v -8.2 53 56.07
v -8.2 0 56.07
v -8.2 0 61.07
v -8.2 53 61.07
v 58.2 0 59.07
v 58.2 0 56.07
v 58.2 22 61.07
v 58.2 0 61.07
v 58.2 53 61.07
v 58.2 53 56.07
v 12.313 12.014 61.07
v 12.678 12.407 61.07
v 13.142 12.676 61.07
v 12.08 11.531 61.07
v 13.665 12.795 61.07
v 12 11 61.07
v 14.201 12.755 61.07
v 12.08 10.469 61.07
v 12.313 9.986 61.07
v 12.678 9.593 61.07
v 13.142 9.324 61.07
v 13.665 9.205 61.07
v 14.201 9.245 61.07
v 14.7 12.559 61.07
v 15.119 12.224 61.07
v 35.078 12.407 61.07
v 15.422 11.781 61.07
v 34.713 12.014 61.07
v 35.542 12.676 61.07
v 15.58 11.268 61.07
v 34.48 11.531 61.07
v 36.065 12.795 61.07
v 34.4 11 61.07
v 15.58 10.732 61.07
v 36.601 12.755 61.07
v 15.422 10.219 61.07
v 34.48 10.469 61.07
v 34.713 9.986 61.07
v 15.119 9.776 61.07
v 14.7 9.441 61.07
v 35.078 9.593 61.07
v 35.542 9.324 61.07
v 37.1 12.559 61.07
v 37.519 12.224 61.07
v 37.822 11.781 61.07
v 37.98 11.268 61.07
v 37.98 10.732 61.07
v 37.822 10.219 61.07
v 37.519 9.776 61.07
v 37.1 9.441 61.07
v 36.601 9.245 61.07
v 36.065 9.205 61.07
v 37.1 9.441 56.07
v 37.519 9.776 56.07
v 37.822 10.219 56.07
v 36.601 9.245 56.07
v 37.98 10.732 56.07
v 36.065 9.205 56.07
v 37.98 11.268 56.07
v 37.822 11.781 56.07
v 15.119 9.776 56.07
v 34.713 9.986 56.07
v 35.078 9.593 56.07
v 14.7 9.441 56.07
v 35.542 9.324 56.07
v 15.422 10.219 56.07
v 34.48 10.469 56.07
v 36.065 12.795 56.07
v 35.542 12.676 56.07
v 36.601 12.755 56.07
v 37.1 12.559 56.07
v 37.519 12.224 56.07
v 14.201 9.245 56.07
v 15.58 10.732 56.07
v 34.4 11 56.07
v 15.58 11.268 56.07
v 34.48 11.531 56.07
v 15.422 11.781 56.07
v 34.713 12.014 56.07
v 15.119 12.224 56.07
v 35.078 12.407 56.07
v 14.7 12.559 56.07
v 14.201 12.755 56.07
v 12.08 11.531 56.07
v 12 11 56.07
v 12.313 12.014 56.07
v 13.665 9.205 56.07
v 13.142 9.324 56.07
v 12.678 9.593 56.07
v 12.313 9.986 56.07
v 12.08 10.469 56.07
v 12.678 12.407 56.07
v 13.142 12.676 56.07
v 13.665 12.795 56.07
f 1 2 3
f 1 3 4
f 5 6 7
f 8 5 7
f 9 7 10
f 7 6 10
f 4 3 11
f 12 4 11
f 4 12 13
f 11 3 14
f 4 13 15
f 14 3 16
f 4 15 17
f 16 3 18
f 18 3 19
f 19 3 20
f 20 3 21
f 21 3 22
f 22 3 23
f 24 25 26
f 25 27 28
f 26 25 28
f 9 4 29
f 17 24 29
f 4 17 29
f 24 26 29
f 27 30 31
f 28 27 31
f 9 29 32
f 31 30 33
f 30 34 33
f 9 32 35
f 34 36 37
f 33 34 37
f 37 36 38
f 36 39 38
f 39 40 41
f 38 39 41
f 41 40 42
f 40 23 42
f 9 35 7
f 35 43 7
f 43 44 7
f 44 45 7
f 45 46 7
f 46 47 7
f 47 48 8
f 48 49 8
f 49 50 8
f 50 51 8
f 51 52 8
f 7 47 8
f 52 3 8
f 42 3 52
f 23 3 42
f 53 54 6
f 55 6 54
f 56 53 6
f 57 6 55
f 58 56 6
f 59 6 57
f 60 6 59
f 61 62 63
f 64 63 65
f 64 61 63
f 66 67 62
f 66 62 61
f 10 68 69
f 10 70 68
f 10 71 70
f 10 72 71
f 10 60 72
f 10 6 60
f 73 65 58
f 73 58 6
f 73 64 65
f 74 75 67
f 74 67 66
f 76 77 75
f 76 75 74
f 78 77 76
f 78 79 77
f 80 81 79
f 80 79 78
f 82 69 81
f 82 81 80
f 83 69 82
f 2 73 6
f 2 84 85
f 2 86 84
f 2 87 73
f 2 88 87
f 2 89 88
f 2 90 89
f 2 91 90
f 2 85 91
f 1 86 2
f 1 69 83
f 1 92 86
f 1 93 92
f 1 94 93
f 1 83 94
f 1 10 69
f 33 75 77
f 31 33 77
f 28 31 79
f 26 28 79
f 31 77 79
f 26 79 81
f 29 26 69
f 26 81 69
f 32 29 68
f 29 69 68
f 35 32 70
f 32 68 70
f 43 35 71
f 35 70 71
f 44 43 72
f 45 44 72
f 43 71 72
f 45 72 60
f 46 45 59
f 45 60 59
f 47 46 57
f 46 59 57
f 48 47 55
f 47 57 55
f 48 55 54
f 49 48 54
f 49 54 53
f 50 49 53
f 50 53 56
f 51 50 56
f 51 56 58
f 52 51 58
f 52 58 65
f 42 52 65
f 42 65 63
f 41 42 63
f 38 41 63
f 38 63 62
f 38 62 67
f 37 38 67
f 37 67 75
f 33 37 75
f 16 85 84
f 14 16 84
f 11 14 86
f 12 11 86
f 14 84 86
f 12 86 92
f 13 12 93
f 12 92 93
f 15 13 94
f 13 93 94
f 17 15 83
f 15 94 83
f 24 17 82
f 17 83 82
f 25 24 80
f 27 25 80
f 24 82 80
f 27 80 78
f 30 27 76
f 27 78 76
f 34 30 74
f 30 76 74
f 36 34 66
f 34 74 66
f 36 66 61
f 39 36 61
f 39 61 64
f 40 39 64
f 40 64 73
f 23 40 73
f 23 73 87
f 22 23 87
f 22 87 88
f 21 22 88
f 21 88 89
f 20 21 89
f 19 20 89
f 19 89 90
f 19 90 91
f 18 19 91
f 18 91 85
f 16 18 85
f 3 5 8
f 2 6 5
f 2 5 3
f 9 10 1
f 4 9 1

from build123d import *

# Parameters (mm, degrees)
SKETCH1_W                = 50
SKETCH1_H                = 9.1
BOSS_EXTRUDE1_DEPTH      = 2
SKETCH2_W                = 25
SKETCH2_H                = 6.6
CUT_EXTRUDE1_DEPTH       = 2
SKETCH3_R                = 1.8
CUT_EXTRUDE2_DEPTH       = 2
SKETCH4_W                = 66.4
SKETCH4_H                = 130
BOSS_EXTRUDE2_DEPTH      = 2
SKETCH5_W                = 66.4
SKETCH5_H                = 2
BOSS_EXTRUDE3_DEPTH      = 2.5
SKETCH6_W                = 8.6
SKETCH6_H                = 62.5
BOSS_EXTRUDE4_DEPTH      = 2
SKETCH7_R                = 1.8
SKETCH7_W                = 3
SKETCH7_H                = 5
CUT_EXTRUDE3_DEPTH       = 2
SKETCH8_W                = 25
SKETCH8_H                = 45
CUT_EXTRUDE4_DEPTH       = 20
SKETCH9_W                = 25
SKETCH9_H                = 10
BOSS_EXTRUDE5_DEPTH      = 2
SKETCH10_W               = 34.7
SKETCH10_H               = 27.07
BOSS_EXTRUDE6_DEPTH      = 2
SKETCH11_R               = 1.8
CUT_EXTRUDE5_DEPTH       = 2
SKETCH12_R               = 1.8
CUT_EXTRUDE6_DEPTH       = 2
SKETCH13_W               = 2
SKETCH13_H               = 2
BOSS_EXTRUDE7_DEPTH      = 44
SKETCH14_W               = 2
SKETCH14_H               = 2
BOSS_EXTRUDE8_DEPTH      = 46
SKETCH16_W               = 42
SKETCH16_H               = 43
BOSS_EXTRUDE10_DEPTH     = 2
SKETCH18_R               = 1.8
CUT_EXTRUDE7_DEPTH       = 2
BOSS_EXTRUDE12_DEPTH     = 2
SKETCH21_W               = 2
SKETCH21_H               = 2
BOSS_EXTRUDE13_DEPTH     = 10
SKETCH25_W               = 3
SKETCH25_H               = 5
CUT_EXTRUDE8_DEPTH       = 10
SKETCH26_W               = 6.2
SKETCH26_H               = 13
SKETCH26_W_2             = 21
SKETCH26_H_2             = 6.6
BOSS_EXTRUDE14_DEPTH     = 2
SKETCH27_W               = 2
SKETCH27_H               = 27
SKETCH27_H_2             = 24.93
BOSS_EXTRUDE15_DEPTH     = 2
SKETCH29_W               = 10
SKETCH29_H               = 10
BOSS_EXTRUDE19_DEPTH     = 2
SKETCH41_R               = 1.8
CUT_EXTRUDE15_DEPTH      = 2
BOSS_EXTRUDE26_DEPTH     = 2
SKETCH43_W               = 70.4
SKETCH43_H               = 2
BOSS_EXTRUDE27_DEPTH     = 11
SKETCH44_W               = 10
SKETCH44_H               = 5
BOSS_EXTRUDE28_DEPTH     = 2
SKETCH45_R               = 1.8
BOSS_EXTRUDE29_DEPTH     = 2
SKETCH46_R               = 1.8
CUT_EXTRUDE16_DEPTH      = 2
SKETCH47_W               = 10
SKETCH47_H               = 1
BOSS_EXTRUDE30_DEPTH     = 2
SKETCH48_W               = 32.7
SKETCH48_H               = 31.07
SKETCH48_W_2             = 101.75
SKETCH48_H_2             = 120.487369876
CUT_EXTRUDE17_DEPTH      = 20
SKETCH50_W               = 66.4
SKETCH50_H               = 81.07
CUT_EXTRUDE19_DEPTH      = 20
SKETCH51_W               = 70.4
SKETCH51_H               = 85.07
SKETCH51_W_2             = 66.4
SKETCH51_H_2             = 81.07
BOSS_EXTRUDE31_DEPTH     = 20
SKETCH52_W               = 10
SKETCH52_H               = 1
BOSS_EXTRUDE32_DEPTH     = 2
SKETCH53_W               = 10
SKETCH53_H               = 4
CUT_EXTRUDE20_DEPTH      = 2
BOSS_EXTRUDE33_START     = 1
SKETCH54_W               = 10
SKETCH54_H               = 12
SKETCH54_R               = 1.8
BOSS_EXTRUDE33_DEPTH     = 1
CUT_EXTRUDE23_DEPTH      = 96
CUT_EXTRUDE23_DEPTH_BACK = 16
SKETCH59_R               = 1.8
SKETCH62_W               = 66.985033768
SKETCH62_H               = 11.249394984
BOSS_EXTRUDE38_DEPTH     = 1
SKETCH65_R               = 1.8
CUT_EXTRUDE27_DEPTH      = 3
SKETCH66_R               = 1
CUT_EXTRUDE28_DEPTH      = 87
BOSS_EXTRUDE41_DEPTH     = 2
BOSS_EXTRUDE42_DEPTH     = 2
BOSS_EXTRUDE43_DEPTH     = 2
SKETCH68_W               = 6.791832398
SKETCH68_H               = 8.144168394
SKETCH68_W_2             = 5.485710784
SKETCH68_W_3             = 7.764004839
SKETCH68_H_2             = 11.628907231
BOSS_EXTRUDE44_DEPTH     = 2
BOSS_EXTRUDE45_DEPTH     = 2
SKETCH70_R               = 1.8
CUT_EXTRUDE29_DEPTH      = 83
SKETCH72_W               = 109.694125273
SKETCH72_H               = 49.124079095
CUT_EXTRUDE30_DEPTH      = 90
SKETCH73_W               = 16.906531278
SKETCH73_H               = 38.825332728
SKETCH73_W_2             = 13.856512057
SKETCH73_H_2             = 35.444026473
CUT_EXTRUDE31_DEPTH      = 90
SKETCH74_W               = 66.4
SKETCH74_H               = 2
BOSS_EXTRUDE46_DEPTH     = 31
BOSS_EXTRUDE47_START     = 3
SKETCH75_W               = 66.4
SKETCH75_H               = 53
SKETCH75_R               = 1.8
BOSS_EXTRUDE47_DEPTH     = 3


with BuildPart() as part:
    # Sketch1 → Boss-Extrude1 (new body)
    with BuildSketch(Plane(origin=(0, 0, 0), x_dir=(1, 0, 0), z_dir=(0, 1, 0))):
        with Locations((25, 4.55)):
            Rectangle(SKETCH1_W, SKETCH1_H)
    extrude(amount=BOSS_EXTRUDE1_DEPTH)

    # Sketch2 → Cut-Extrude1 (cut)
    with BuildSketch(Plane(origin=(0, 2, 0), x_dir=(1, 0, 0), z_dir=(0, 1, 0))):
        with Locations((25, 5.8)):
            Rectangle(SKETCH2_W, SKETCH2_H)
    extrude(amount=-CUT_EXTRUDE1_DEPTH, mode=Mode.SUBTRACT)

    # Sketch3 → Cut-Extrude2 (cut)
    with BuildSketch(Plane(origin=(0, 2, 0), x_dir=(1, 0, 0), z_dir=(0, 1, 0))):
        with Locations(Location((6.25, 5.8, 0), (0, 0, 270))):
            Circle(SKETCH3_R)
        with Locations(Location((43.75, 5.8, 0), (0, 0, 270))):
            Circle(SKETCH3_R)
    extrude(amount=-CUT_EXTRUDE2_DEPTH, mode=Mode.SUBTRACT)

    # Sketch4 → Boss-Extrude2 (add)
    with BuildSketch(Plane(origin=(0, 2, 0), x_dir=(1, 0, 0), z_dir=(0, 1, 0))):
        with Locations((25, -65)):
            Rectangle(SKETCH4_W, SKETCH4_H)
    extrude(amount=-BOSS_EXTRUDE2_DEPTH)

    # Sketch5 → Boss-Extrude3 (add)
    with BuildSketch(Plane.XY.offset(130)):
        with Locations((25, 1)):
            Rectangle(SKETCH5_W, SKETCH5_H)
    extrude(amount=BOSS_EXTRUDE3_DEPTH)

    # Sketch6 → Boss-Extrude4 (add)
    with BuildSketch(Plane(origin=(0, 2, 0), x_dir=(1, 0, 0), z_dir=(0, 1, 0))):
        with Locations((-12.5, -101.25)):
            Rectangle(SKETCH6_W, SKETCH6_H)
        with Locations((62.5, -101.25)):
            Rectangle(SKETCH6_W, SKETCH6_H)
    extrude(amount=-BOSS_EXTRUDE4_DEPTH)

    # Sketch7 → Cut-Extrude3 (cut)
    with BuildSketch(Plane(origin=(0, 2, 0), x_dir=(1, 0, 0), z_dir=(0, 1, 0))):
        with Locations(Location((-13.5, -77, 0), (0, 0, 270))):
            Circle(SKETCH7_R)
        with Locations(Location((-13.5, -101.25, 0), (0, 0, 270))):
            Circle(SKETCH7_R)
        with Locations(Location((-13.5, -125.5, 0), (0, 0, 270))):
            Circle(SKETCH7_R)
        with Locations(Location((63.5, -77, 0), (0, 0, 270))):
            Circle(SKETCH7_R)
        with Locations(Location((63.5, -101.25, 0), (0, 0, 270))):
            Circle(SKETCH7_R)
        with Locations(Location((63.5, -125.5, 0), (0, 0, 270))):
            Circle(SKETCH7_R)
        with Locations((-13.5, -117.5)):
            Rectangle(SKETCH7_W, SKETCH7_H)
        with Locations((63.5, -117.5)):
            Rectangle(SKETCH7_W, SKETCH7_H)
    extrude(amount=-CUT_EXTRUDE3_DEPTH, mode=Mode.SUBTRACT)

    # Sketch8 → Cut-Extrude4 (cut)
    with BuildSketch(Plane(origin=(0, 2, 0), x_dir=(1, 0, 0), z_dir=(0, 1, 0))):
        with Locations((25, -22.5)):
            Rectangle(SKETCH8_W, SKETCH8_H)
    extrude(amount=-CUT_EXTRUDE4_DEPTH, mode=Mode.SUBTRACT)

    # Sketch9 → Boss-Extrude5 (add)
    with BuildSketch(Plane(origin=(0, 2, 0), x_dir=(1, 0, 0), z_dir=(0, 1, 0))):
        with Locations((25, -5)):
            Rectangle(SKETCH9_W, SKETCH9_H)
    extrude(amount=-BOSS_EXTRUDE5_DEPTH)

    # Sketch10 → Boss-Extrude6 (add)
    with BuildSketch(Plane(origin=(0, 2, 0), x_dir=(1, 0, 0), z_dir=(0, 1, 0))):
        with Locations((-25.55, -29.535)):
            Rectangle(SKETCH10_W, SKETCH10_H)
        with Locations((75.55, -29.535)):
            Rectangle(SKETCH10_W, SKETCH10_H)
    extrude(amount=-BOSS_EXTRUDE6_DEPTH)

    # Sketch11 → Cut-Extrude5 (cut)
    with BuildSketch(Plane(origin=(0, 2, 0), x_dir=(1, 0, 0), z_dir=(0, 1, 0))):
        with Locations(Location((-36.9, -19.25, 0), (0, 0, 270))):
            Circle(SKETCH11_R)
        with Locations(Location((-36.9, -39.82, 0), (0, 0, 270))):
            Circle(SKETCH11_R)
        with Locations(Location((-22.6, -19.25, 0), (0, 0, 270))):
            Circle(SKETCH11_R)
        with Locations(Location((-22.6, -39.82, 0), (0, 0, 270))):
            Circle(SKETCH11_R)
    extrude(amount=-CUT_EXTRUDE5_DEPTH, mode=Mode.SUBTRACT)

    # Sketch12 → Cut-Extrude6 (cut)
    with BuildSketch(Plane(origin=(0, 2, 0), x_dir=(1, 0, 0), z_dir=(0, 1, 0))):
        with Locations(Location((72.6, -19.25, 0), (0, 0, 270))):
            Circle(SKETCH12_R)
        with Locations(Location((86.9, -19.25, 0), (0, 0, 270))):
            Circle(SKETCH12_R)
        with Locations(Location((72.6, -39.82, 0), (0, 0, 270))):
            Circle(SKETCH12_R)
        with Locations(Location((86.9, -39.82, 0), (0, 0, 270))):
            Circle(SKETCH12_R)
    extrude(amount=-CUT_EXTRUDE6_DEPTH, mode=Mode.SUBTRACT)

    # Sketch13 → Boss-Extrude7 (add)
    with BuildSketch(Plane.ZY.offset(42.9)):
        with Locations((15, 1)):
            Rectangle(SKETCH13_W, SKETCH13_H)
        with Locations((44.07, 1)):
            Rectangle(SKETCH13_W, SKETCH13_H)
    extrude(amount=-BOSS_EXTRUDE7_DEPTH)

    # Sketch14 → Boss-Extrude8 (add)
    with BuildSketch(Plane(origin=(92.9, 0, 0), x_dir=(0, 0, -1), z_dir=(1, 0, 0))):
        with Locations((-15, 1)):
            Rectangle(SKETCH14_W, SKETCH14_H)
        with Locations((-44.07, 1)):
            Rectangle(SKETCH14_W, SKETCH14_H)
    extrude(amount=-BOSS_EXTRUDE8_DEPTH)

    # Sketch16 → Boss-Extrude10 (add)
    with BuildSketch(Plane(origin=(0, 2, 0), x_dir=(1, 0, 0), z_dir=(0, 1, 0))):
        with Locations((25, -154)):
            Rectangle(SKETCH16_W, SKETCH16_H)
    extrude(amount=-BOSS_EXTRUDE10_DEPTH)

    # Sketch18 → Cut-Extrude7 (cut)
    with BuildSketch(Plane(origin=(0, 2, 0), x_dir=(1, 0, 0), z_dir=(0, 1, 0))):
        with Locations(Location((8.74, -171.03, 0), (0, 0, 270))):
            Circle(SKETCH18_R)
        with Locations(Location((41.26, -171.03, 0), (0, 0, 270))):
            Circle(SKETCH18_R)
        with Locations(Location((8.74, -138.5, 0), (0, 0, 270))):
            Circle(SKETCH18_R)
        with Locations(Location((41.26, -138.5, 0), (0, 0, 270))):
            Circle(SKETCH18_R)
    extrude(amount=-CUT_EXTRUDE7_DEPTH, mode=Mode.SUBTRACT)

    # Sketch20 → Boss-Extrude12 (add)
    with BuildSketch(Plane(origin=(0, 2, 0), x_dir=(1, 0, 0), z_dir=(0, 1, 0))):
        with BuildLine():
            Line((-2, -132.5), (4, -132.5))
            Line((4, -132.5), (4, -138.5))
            ThreePointArc((4, -138.5), (2.242640687, -134.257359313), (-2, -132.5))
        make_face()
        with BuildLine():
            ThreePointArc((52, -132.5), (47.757359313, -134.257359313), (46, -138.5))
            Line((46, -138.5), (46, -132.5))
            Line((46, -132.5), (52, -132.5))
        make_face()
    extrude(amount=-BOSS_EXTRUDE12_DEPTH)

    # Sketch21 → Boss-Extrude13 (add)
    with BuildSketch(Plane(origin=(0, 0, -9.1), x_dir=(-1, 0, 0), z_dir=(0, 0, -1))):
        with Locations((-51, 1)):
            Rectangle(SKETCH21_W, SKETCH21_H)
        with Locations((-36.5, 1)):
            Rectangle(SKETCH21_W, SKETCH21_H)
        with Locations((-13.5, 1)):
            Rectangle(SKETCH21_W, SKETCH21_H)
        with Locations((1, 1)):
            Rectangle(SKETCH21_W, SKETCH21_H)
    extrude(amount=-BOSS_EXTRUDE13_DEPTH)

    # Sketch25 → Cut-Extrude8 (cut)
    with BuildSketch(Plane(origin=(0, 2, 0), x_dir=(1, 0, 0), z_dir=(0, 1, 0))):
        with Locations((-11.7, -22.5)):
            Rectangle(SKETCH25_W, SKETCH25_H)
        with Locations((-11.7, -36.57)):
            Rectangle(SKETCH25_W, SKETCH25_H)
        with Locations((61.7, -22.5)):
            Rectangle(SKETCH25_W, SKETCH25_H)
        with Locations((61.7, -36.57)):
            Rectangle(SKETCH25_W, SKETCH25_H)
    extrude(amount=-CUT_EXTRUDE8_DEPTH, mode=Mode.SUBTRACT)

    # Sketch26 → Boss-Extrude14 (add)
    with BuildSketch(Plane(origin=(0, 2, 0), x_dir=(1, 0, 0), z_dir=(0, 1, 0))):
        with Locations((-5.1, 6.5)):
            Rectangle(SKETCH26_W, SKETCH26_H)
        Polygon((-2, 13), (-2, 9.1), (14.5, 9.1), (35.5, 9.1), (52, 9.1), (52, 13), align=None)
        with Locations((25, 5.8)):
            Rectangle(SKETCH26_W_2, SKETCH26_H_2)
        with Locations((55.1, 6.5)):
            Rectangle(SKETCH26_W, SKETCH26_H)
    extrude(amount=-BOSS_EXTRUDE14_DEPTH)

    # Sketch27 → Boss-Extrude15 (add)
    with BuildSketch(Plane(origin=(0, 2, 0), x_dir=(1, 0, 0), z_dir=(0, 1, 0))):
        with Locations((-9.2, -0.5)):
            Rectangle(SKETCH27_W, SKETCH27_H)
        with Locations((-9.2, -57.535)):
            Rectangle(SKETCH27_W, SKETCH27_H_2)
        with Locations((59.2, -0.5)):
            Rectangle(SKETCH27_W, SKETCH27_H)
        with Locations((59.2, -57.535)):
            Rectangle(SKETCH27_W, SKETCH27_H_2)
    extrude(amount=-BOSS_EXTRUDE15_DEPTH)

    # Sketch29 → Boss-Extrude19 (add)
    with BuildSketch(Plane(origin=(0, 2, 0), x_dir=(1, 0, 0), z_dir=(0, 1, 0))):
        with Locations((-15.2, -9)):
            Rectangle(SKETCH29_W, SKETCH29_H)
        with Locations((-15.2, -50.07)):
            Rectangle(SKETCH29_W, SKETCH29_H)
        with Locations((65.2, -9)):
            Rectangle(SKETCH29_W, SKETCH29_H)
        with Locations((65.2, -50.07)):
            Rectangle(SKETCH29_W, SKETCH29_H)
    extrude(amount=-BOSS_EXTRUDE19_DEPTH)

    # Sketch41 → Cut-Extrude15 (cut)
    with BuildSketch(Plane(origin=(0, 2, 0), x_dir=(1, 0, 0), z_dir=(0, 1, 0))):
        with Locations(Location((-15.2, -9, 0), (0, 0, 270))):
            Circle(SKETCH41_R)
        with Locations(Location((-15.2, -50.07, 0), (0, 0, 270))):
            Circle(SKETCH41_R)
        with Locations(Location((65.2, -9, 0), (0, 0, 270))):
            Circle(SKETCH41_R)
        with Locations(Location((65.2, -50.07, 0), (0, 0, 270))):
            Circle(SKETCH41_R)
    extrude(amount=-CUT_EXTRUDE15_DEPTH, mode=Mode.SUBTRACT)

    # Sketch42 → Boss-Extrude26 (add)
    with BuildSketch(Plane(origin=(0, 2, 0), x_dir=(1, 0, 0), z_dir=(0, 1, 0))):
        with BuildLine():
            Line((-16.8, -70), (-10.2, -70))
            Line((-10.2, -70), (-10.2, -63.4))
            ThreePointArc((-10.2, -63.4), (-12.133095244, -68.066904756), (-16.8, -70))
        make_face()
        with BuildLine():
            Line((60.2, -63.4), (60.2, -70))
            Line((60.2, -70), (66.8, -70))
            ThreePointArc((66.8, -70), (62.133095244, -68.066904756), (60.2, -63.4))
        make_face()
    extrude(amount=-BOSS_EXTRUDE26_DEPTH)

    # Sketch43 → Boss-Extrude27 (add)
    with BuildSketch(Plane(origin=(0, 0, -13), x_dir=(-1, 0, 0), z_dir=(0, 0, -1))):
        with Locations((-25, 1)):
            Rectangle(SKETCH43_W, SKETCH43_H)
    extrude(amount=BOSS_EXTRUDE27_DEPTH)

    # Sketch44 → Boss-Extrude28 (add)
    with BuildSketch(Plane(origin=(0, 2, 0), x_dir=(1, 0, 0), z_dir=(0, 1, 0))):
        with Locations((-15.2, -57.57)):
            Rectangle(SKETCH44_W, SKETCH44_H)
        with Locations((65.2, -57.57)):
            Rectangle(SKETCH44_W, SKETCH44_H)
    extrude(amount=-BOSS_EXTRUDE28_DEPTH)

    # Sketch45 → Boss-Extrude29 (add)
    with BuildSketch(Plane(origin=(0, 2, 0), x_dir=(1, 0, 0), z_dir=(0, 1, 0))):
        with Locations((-15.2, -50.07)):
            Circle(SKETCH45_R)
        with Locations((65.2, -50.07)):
            Circle(SKETCH45_R)
    extrude(amount=-BOSS_EXTRUDE29_DEPTH)

    # Sketch46 → Cut-Extrude16 (cut)
    with BuildSketch(Plane(origin=(0, 2, 0), x_dir=(1, 0, 0), z_dir=(0, 1, 0))):
        with Locations(Location((-15.2, -55.07, 0), (0, 0, 270))):
            Circle(SKETCH46_R)
        with Locations(Location((65.2, -55.07, 0), (0, 0, 270))):
            Circle(SKETCH46_R)
    extrude(amount=-CUT_EXTRUDE16_DEPTH, mode=Mode.SUBTRACT)

    # Sketch47 → Boss-Extrude30 (add)
    with BuildSketch(Plane(origin=(0, 2, 0), x_dir=(1, 0, 0), z_dir=(0, 1, 0))):
        with Locations((-15.2, -3.5)):
            Rectangle(SKETCH47_W, SKETCH47_H)
        with Locations((-15.2, -60.57)):
            Rectangle(SKETCH47_W, SKETCH47_H)
        with Locations((65.2, -3.5)):
            Rectangle(SKETCH47_W, SKETCH47_H)
        with Locations((65.2, -60.57)):
            Rectangle(SKETCH47_W, SKETCH47_H)
    extrude(amount=-BOSS_EXTRUDE30_DEPTH)

    # Sketch48 → Cut-Extrude17 (cut)
    with BuildSketch(Plane(origin=(0, 2, 0), x_dir=(1, 0, 0), z_dir=(0, 1, 0))):
        with Locations((-26.55, -29.535)):
            Rectangle(SKETCH48_W, SKETCH48_H)
        with Locations((76.55, -29.535)):
            Rectangle(SKETCH48_W, SKETCH48_H)
        with Locations((30.675, -121.313684938)):
            Rectangle(SKETCH48_W_2, SKETCH48_H_2)
    extrude(amount=-CUT_EXTRUDE17_DEPTH, mode=Mode.SUBTRACT)

    # Sketch50 → Cut-Extrude19 (cut)
    with BuildSketch(Plane(origin=(0, 2, 0), x_dir=(1, 0, 0), z_dir=(0, 1, 0))):
        with Locations((25, -18.535)):
            Rectangle(SKETCH50_W, SKETCH50_H)
    extrude(amount=-CUT_EXTRUDE19_DEPTH, mode=Mode.SUBTRACT)

    # Sketch51 → Boss-Extrude31 (add)
    with BuildSketch(Plane(origin=(0, 2, 0), x_dir=(1, 0, 0), z_dir=(0, 1, 0))):
        with Locations((25, -18.535)):
            Rectangle(SKETCH51_W, SKETCH51_H)
        with Locations((25, -18.535)):
            Rectangle(SKETCH51_W_2, SKETCH51_H_2, mode=Mode.SUBTRACT)
    extrude(amount=BOSS_EXTRUDE31_DEPTH)

    # Sketch52 → Boss-Extrude32 (add)
    with BuildSketch(Plane(origin=(0, 2, 0), x_dir=(1, 0, 0), z_dir=(0, 1, 0))):
        with Locations((-15.2, -14.5)):
            Rectangle(SKETCH52_W, SKETCH52_H)
        with Locations((65.2, -14.5)):
            Rectangle(SKETCH52_W, SKETCH52_H)
    extrude(amount=-BOSS_EXTRUDE32_DEPTH)

    # Sketch53 → Cut-Extrude20 (cut)
    with BuildSketch(Plane(origin=(0, 2, 0), x_dir=(1, 0, 0), z_dir=(0, 1, 0))):
        with Locations((-15.2, -47.07)):
            Rectangle(SKETCH53_W, SKETCH53_H)
        with Locations((65.2, -47.07)):
            Rectangle(SKETCH53_W, SKETCH53_H)
    extrude(amount=-CUT_EXTRUDE20_DEPTH, mode=Mode.SUBTRACT)

    # Sketch54 → Boss-Extrude33 (add)
    # profile 1 of 4: a face of its own
    with BuildSketch(Plane(origin=(0, 2, 0), x_dir=(1, 0, 0), z_dir=(0, 1, 0)).offset(BOSS_EXTRUDE33_START)):
        with Locations((-15.2, -9)):
            Rectangle(SKETCH54_W, SKETCH54_H)
        with Locations(Location((-15.2, -9, 0), (0, 0, 270))):
            Circle(SKETCH54_R, mode=Mode.SUBTRACT)
    # profile 2 of 4: a face of its own
    with BuildSketch(Plane(origin=(0, 2, 0), x_dir=(1, 0, 0), z_dir=(0, 1, 0)).offset(BOSS_EXTRUDE33_START)):
        with Locations((-15.2, -55.07)):
            Rectangle(SKETCH54_W, SKETCH54_H)
        with Locations(Location((-15.2, -55.07, 0), (0, 0, 270))):
            Circle(SKETCH54_R, mode=Mode.SUBTRACT)
    # profile 3 of 4: a face of its own
    with BuildSketch(Plane(origin=(0, 2, 0), x_dir=(1, 0, 0), z_dir=(0, 1, 0)).offset(BOSS_EXTRUDE33_START)):
        with Locations((65.2, -9)):
            Rectangle(SKETCH54_W, SKETCH54_H)
        with Locations(Location((65.2, -9, 0), (0, 0, 270))):
            Circle(SKETCH54_R, mode=Mode.SUBTRACT)
    # profile 4 of 4: a face of its own
    with BuildSketch(Plane(origin=(0, 2, 0), x_dir=(1, 0, 0), z_dir=(0, 1, 0)).offset(BOSS_EXTRUDE33_START)):
        with Locations((65.2, -55.07)):
            Rectangle(SKETCH54_W, SKETCH54_H)
        with Locations(Location((65.2, -55.07, 0), (0, 0, 270))):
            Circle(SKETCH54_R, mode=Mode.SUBTRACT)
    extrude(amount=-BOSS_EXTRUDE33_DEPTH)

    # Sketch59 → Cut-Extrude23 (cut, two sides: drawn at the far end of the back side and taken through both)
    with BuildSketch(Plane.XY.offset(-22).offset(-CUT_EXTRUDE23_DEPTH_BACK)):
        with Locations((-3.2, 11)):
            Circle(SKETCH59_R)
        with Locations((53.2, 11)):
            Circle(SKETCH59_R)
        with Locations((25, 11)):
            Circle(SKETCH59_R)
    extrude(amount=CUT_EXTRUDE23_DEPTH + CUT_EXTRUDE23_DEPTH_BACK, mode=Mode.SUBTRACT)

    # Sketch62 → Boss-Extrude38 (add)
    with BuildSketch(Plane.XY.offset(61.07)):
        with Locations((24.914777311, 10.744331932)):
            Rectangle(SKETCH62_W, SKETCH62_H)
    extrude(amount=-BOSS_EXTRUDE38_DEPTH)

    # Sketch65 → Cut-Extrude27 (cut)
    with BuildSketch(Plane(origin=(0, 0, 59.07), x_dir=(-1, 0, 0), z_dir=(0, 0, -1))):
        with Locations((-13.8, 11)):
            Circle(SKETCH65_R)
        with Locations((-36.2, 11)):
            Circle(SKETCH65_R)
    extrude(amount=-CUT_EXTRUDE27_DEPTH, mode=Mode.SUBTRACT)

    # Sketch66 → Cut-Extrude28 (cut)
    with BuildSketch(Plane.ZY.offset(10.2)):
        with Locations((32.035, 16)):
            Circle(SKETCH66_R)
    extrude(amount=-CUT_EXTRUDE28_DEPTH, mode=Mode.SUBTRACT)

    # Sketch55 → Boss-Extrude41 (add)
    with BuildSketch(Plane(origin=(0, 0, 3), x_dir=(-1, 0, 0), z_dir=(0, 0, -1))):
        Polygon((20.2, 3), (10.2, 22), (10.2, 3), align=None)
        Polygon((-70.2, 3), (-60.2, 3), (-60.2, 22), align=None)
    extrude(amount=-BOSS_EXTRUDE41_DEPTH)

    # Sketch56 → Boss-Extrude42 (add)
    with BuildSketch(Plane.XY.offset(15)):
        Polygon((-20.2, 3), (-10.2, 3), (-10.2, 22), align=None)
        Polygon((70.2, 3), (60.2, 3), (60.2, 22), align=None)
    extrude(amount=-BOSS_EXTRUDE42_DEPTH)

    # Sketch57 → Boss-Extrude43 (add)
    with BuildSketch(Plane(origin=(0, 0, 49.07), x_dir=(-1, 0, 0), z_dir=(0, 0, -1))):
        Polygon((20.2, 3), (10.2, 3), (10.2, 22), align=None)
        Polygon((-70.2, 3), (-60.2, 3), (-60.2, 22), align=None)
    extrude(amount=-BOSS_EXTRUDE43_DEPTH)

    # Sketch68 → Boss-Extrude44 (add)
    with BuildSketch(Plane(origin=(0, 0, 59.07), x_dir=(-1, 0, 0), z_dir=(0, 0, -1))):
        with Locations((2.499419559, 10.346452983)):
            Rectangle(SKETCH68_W, SKETCH68_H)
        with Locations((-24.624372648, 10.346452983)):
            Rectangle(SKETCH68_W_2, SKETCH68_H)
        with Locations((-52.231743322, 12.088822401)):
            Rectangle(SKETCH68_W_3, SKETCH68_H_2)
    extrude(amount=-BOSS_EXTRUDE44_DEPTH)

    # Sketch69 → Boss-Extrude45 (add)
    with BuildSketch(Plane.XY.offset(61.07)):
        Polygon((-20.2, 3), (-10.2, 3), (-10.2, 22), align=None)
        Polygon((60.2, 3), (70.2, 3), (60.2, 22), align=None)
    extrude(amount=-BOSS_EXTRUDE45_DEPTH)

    # Sketch70 → Cut-Extrude29 (cut)
    with BuildSketch(Plane.ZY.offset(10.2)):
        with Locations((9, 17)):
            Circle(SKETCH70_R)
        with Locations((55.07, 17)):
            Circle(SKETCH70_R)
    extrude(amount=-CUT_EXTRUDE29_DEPTH, mode=Mode.SUBTRACT)

    # Sketch72 → Cut-Extrude30 (cut)
    with BuildSketch(Plane(origin=(0, 0, 59.07), x_dir=(-1, 0, 0), z_dir=(0, 0, -1))):
        with Locations((-21.065003352, -2.562039548)):
            Rectangle(SKETCH72_W, SKETCH72_H)
    extrude(amount=CUT_EXTRUDE30_DEPTH, mode=Mode.SUBTRACT)

    # Sketch73 → Cut-Extrude31 (cut)
    with BuildSketch(Plane(origin=(0, 0, 59.07), x_dir=(-1, 0, 0), z_dir=(0, 0, -1))):
        with Locations((16.653265639, 2.587333636)):
            Rectangle(SKETCH73_W, SKETCH73_H)
        with Locations((-65.128256029, 4.277986763)):
            Rectangle(SKETCH73_W_2, SKETCH73_H_2)
    extrude(amount=-CUT_EXTRUDE31_DEPTH, mode=Mode.SUBTRACT)

    # Sketch74 → Boss-Extrude46 (add)
    with BuildSketch(Plane(origin=(0, 22, 0), x_dir=(1, 0, 0), z_dir=(0, 1, 0))):
        with Locations((25, -60.07)):
            Rectangle(SKETCH74_W, SKETCH74_H)
    extrude(amount=BOSS_EXTRUDE46_DEPTH)

    # Sketch75 → Boss-Extrude47 (add)
    with BuildSketch(Plane(origin=(0, 0, 59.07), x_dir=(-1, 0, 0), z_dir=(0, 0, -1)).offset(BOSS_EXTRUDE47_START)):
        with Locations((-25, 26.5)):
            Rectangle(SKETCH75_W, SKETCH75_H)
        with Locations((-13.8, 11)):
            Circle(SKETCH75_R, mode=Mode.SUBTRACT)
        with Locations((-36.2, 11)):
            Circle(SKETCH75_R, mode=Mode.SUBTRACT)
    extrude(amount=-BOSS_EXTRUDE47_DEPTH)


solid = part.part
